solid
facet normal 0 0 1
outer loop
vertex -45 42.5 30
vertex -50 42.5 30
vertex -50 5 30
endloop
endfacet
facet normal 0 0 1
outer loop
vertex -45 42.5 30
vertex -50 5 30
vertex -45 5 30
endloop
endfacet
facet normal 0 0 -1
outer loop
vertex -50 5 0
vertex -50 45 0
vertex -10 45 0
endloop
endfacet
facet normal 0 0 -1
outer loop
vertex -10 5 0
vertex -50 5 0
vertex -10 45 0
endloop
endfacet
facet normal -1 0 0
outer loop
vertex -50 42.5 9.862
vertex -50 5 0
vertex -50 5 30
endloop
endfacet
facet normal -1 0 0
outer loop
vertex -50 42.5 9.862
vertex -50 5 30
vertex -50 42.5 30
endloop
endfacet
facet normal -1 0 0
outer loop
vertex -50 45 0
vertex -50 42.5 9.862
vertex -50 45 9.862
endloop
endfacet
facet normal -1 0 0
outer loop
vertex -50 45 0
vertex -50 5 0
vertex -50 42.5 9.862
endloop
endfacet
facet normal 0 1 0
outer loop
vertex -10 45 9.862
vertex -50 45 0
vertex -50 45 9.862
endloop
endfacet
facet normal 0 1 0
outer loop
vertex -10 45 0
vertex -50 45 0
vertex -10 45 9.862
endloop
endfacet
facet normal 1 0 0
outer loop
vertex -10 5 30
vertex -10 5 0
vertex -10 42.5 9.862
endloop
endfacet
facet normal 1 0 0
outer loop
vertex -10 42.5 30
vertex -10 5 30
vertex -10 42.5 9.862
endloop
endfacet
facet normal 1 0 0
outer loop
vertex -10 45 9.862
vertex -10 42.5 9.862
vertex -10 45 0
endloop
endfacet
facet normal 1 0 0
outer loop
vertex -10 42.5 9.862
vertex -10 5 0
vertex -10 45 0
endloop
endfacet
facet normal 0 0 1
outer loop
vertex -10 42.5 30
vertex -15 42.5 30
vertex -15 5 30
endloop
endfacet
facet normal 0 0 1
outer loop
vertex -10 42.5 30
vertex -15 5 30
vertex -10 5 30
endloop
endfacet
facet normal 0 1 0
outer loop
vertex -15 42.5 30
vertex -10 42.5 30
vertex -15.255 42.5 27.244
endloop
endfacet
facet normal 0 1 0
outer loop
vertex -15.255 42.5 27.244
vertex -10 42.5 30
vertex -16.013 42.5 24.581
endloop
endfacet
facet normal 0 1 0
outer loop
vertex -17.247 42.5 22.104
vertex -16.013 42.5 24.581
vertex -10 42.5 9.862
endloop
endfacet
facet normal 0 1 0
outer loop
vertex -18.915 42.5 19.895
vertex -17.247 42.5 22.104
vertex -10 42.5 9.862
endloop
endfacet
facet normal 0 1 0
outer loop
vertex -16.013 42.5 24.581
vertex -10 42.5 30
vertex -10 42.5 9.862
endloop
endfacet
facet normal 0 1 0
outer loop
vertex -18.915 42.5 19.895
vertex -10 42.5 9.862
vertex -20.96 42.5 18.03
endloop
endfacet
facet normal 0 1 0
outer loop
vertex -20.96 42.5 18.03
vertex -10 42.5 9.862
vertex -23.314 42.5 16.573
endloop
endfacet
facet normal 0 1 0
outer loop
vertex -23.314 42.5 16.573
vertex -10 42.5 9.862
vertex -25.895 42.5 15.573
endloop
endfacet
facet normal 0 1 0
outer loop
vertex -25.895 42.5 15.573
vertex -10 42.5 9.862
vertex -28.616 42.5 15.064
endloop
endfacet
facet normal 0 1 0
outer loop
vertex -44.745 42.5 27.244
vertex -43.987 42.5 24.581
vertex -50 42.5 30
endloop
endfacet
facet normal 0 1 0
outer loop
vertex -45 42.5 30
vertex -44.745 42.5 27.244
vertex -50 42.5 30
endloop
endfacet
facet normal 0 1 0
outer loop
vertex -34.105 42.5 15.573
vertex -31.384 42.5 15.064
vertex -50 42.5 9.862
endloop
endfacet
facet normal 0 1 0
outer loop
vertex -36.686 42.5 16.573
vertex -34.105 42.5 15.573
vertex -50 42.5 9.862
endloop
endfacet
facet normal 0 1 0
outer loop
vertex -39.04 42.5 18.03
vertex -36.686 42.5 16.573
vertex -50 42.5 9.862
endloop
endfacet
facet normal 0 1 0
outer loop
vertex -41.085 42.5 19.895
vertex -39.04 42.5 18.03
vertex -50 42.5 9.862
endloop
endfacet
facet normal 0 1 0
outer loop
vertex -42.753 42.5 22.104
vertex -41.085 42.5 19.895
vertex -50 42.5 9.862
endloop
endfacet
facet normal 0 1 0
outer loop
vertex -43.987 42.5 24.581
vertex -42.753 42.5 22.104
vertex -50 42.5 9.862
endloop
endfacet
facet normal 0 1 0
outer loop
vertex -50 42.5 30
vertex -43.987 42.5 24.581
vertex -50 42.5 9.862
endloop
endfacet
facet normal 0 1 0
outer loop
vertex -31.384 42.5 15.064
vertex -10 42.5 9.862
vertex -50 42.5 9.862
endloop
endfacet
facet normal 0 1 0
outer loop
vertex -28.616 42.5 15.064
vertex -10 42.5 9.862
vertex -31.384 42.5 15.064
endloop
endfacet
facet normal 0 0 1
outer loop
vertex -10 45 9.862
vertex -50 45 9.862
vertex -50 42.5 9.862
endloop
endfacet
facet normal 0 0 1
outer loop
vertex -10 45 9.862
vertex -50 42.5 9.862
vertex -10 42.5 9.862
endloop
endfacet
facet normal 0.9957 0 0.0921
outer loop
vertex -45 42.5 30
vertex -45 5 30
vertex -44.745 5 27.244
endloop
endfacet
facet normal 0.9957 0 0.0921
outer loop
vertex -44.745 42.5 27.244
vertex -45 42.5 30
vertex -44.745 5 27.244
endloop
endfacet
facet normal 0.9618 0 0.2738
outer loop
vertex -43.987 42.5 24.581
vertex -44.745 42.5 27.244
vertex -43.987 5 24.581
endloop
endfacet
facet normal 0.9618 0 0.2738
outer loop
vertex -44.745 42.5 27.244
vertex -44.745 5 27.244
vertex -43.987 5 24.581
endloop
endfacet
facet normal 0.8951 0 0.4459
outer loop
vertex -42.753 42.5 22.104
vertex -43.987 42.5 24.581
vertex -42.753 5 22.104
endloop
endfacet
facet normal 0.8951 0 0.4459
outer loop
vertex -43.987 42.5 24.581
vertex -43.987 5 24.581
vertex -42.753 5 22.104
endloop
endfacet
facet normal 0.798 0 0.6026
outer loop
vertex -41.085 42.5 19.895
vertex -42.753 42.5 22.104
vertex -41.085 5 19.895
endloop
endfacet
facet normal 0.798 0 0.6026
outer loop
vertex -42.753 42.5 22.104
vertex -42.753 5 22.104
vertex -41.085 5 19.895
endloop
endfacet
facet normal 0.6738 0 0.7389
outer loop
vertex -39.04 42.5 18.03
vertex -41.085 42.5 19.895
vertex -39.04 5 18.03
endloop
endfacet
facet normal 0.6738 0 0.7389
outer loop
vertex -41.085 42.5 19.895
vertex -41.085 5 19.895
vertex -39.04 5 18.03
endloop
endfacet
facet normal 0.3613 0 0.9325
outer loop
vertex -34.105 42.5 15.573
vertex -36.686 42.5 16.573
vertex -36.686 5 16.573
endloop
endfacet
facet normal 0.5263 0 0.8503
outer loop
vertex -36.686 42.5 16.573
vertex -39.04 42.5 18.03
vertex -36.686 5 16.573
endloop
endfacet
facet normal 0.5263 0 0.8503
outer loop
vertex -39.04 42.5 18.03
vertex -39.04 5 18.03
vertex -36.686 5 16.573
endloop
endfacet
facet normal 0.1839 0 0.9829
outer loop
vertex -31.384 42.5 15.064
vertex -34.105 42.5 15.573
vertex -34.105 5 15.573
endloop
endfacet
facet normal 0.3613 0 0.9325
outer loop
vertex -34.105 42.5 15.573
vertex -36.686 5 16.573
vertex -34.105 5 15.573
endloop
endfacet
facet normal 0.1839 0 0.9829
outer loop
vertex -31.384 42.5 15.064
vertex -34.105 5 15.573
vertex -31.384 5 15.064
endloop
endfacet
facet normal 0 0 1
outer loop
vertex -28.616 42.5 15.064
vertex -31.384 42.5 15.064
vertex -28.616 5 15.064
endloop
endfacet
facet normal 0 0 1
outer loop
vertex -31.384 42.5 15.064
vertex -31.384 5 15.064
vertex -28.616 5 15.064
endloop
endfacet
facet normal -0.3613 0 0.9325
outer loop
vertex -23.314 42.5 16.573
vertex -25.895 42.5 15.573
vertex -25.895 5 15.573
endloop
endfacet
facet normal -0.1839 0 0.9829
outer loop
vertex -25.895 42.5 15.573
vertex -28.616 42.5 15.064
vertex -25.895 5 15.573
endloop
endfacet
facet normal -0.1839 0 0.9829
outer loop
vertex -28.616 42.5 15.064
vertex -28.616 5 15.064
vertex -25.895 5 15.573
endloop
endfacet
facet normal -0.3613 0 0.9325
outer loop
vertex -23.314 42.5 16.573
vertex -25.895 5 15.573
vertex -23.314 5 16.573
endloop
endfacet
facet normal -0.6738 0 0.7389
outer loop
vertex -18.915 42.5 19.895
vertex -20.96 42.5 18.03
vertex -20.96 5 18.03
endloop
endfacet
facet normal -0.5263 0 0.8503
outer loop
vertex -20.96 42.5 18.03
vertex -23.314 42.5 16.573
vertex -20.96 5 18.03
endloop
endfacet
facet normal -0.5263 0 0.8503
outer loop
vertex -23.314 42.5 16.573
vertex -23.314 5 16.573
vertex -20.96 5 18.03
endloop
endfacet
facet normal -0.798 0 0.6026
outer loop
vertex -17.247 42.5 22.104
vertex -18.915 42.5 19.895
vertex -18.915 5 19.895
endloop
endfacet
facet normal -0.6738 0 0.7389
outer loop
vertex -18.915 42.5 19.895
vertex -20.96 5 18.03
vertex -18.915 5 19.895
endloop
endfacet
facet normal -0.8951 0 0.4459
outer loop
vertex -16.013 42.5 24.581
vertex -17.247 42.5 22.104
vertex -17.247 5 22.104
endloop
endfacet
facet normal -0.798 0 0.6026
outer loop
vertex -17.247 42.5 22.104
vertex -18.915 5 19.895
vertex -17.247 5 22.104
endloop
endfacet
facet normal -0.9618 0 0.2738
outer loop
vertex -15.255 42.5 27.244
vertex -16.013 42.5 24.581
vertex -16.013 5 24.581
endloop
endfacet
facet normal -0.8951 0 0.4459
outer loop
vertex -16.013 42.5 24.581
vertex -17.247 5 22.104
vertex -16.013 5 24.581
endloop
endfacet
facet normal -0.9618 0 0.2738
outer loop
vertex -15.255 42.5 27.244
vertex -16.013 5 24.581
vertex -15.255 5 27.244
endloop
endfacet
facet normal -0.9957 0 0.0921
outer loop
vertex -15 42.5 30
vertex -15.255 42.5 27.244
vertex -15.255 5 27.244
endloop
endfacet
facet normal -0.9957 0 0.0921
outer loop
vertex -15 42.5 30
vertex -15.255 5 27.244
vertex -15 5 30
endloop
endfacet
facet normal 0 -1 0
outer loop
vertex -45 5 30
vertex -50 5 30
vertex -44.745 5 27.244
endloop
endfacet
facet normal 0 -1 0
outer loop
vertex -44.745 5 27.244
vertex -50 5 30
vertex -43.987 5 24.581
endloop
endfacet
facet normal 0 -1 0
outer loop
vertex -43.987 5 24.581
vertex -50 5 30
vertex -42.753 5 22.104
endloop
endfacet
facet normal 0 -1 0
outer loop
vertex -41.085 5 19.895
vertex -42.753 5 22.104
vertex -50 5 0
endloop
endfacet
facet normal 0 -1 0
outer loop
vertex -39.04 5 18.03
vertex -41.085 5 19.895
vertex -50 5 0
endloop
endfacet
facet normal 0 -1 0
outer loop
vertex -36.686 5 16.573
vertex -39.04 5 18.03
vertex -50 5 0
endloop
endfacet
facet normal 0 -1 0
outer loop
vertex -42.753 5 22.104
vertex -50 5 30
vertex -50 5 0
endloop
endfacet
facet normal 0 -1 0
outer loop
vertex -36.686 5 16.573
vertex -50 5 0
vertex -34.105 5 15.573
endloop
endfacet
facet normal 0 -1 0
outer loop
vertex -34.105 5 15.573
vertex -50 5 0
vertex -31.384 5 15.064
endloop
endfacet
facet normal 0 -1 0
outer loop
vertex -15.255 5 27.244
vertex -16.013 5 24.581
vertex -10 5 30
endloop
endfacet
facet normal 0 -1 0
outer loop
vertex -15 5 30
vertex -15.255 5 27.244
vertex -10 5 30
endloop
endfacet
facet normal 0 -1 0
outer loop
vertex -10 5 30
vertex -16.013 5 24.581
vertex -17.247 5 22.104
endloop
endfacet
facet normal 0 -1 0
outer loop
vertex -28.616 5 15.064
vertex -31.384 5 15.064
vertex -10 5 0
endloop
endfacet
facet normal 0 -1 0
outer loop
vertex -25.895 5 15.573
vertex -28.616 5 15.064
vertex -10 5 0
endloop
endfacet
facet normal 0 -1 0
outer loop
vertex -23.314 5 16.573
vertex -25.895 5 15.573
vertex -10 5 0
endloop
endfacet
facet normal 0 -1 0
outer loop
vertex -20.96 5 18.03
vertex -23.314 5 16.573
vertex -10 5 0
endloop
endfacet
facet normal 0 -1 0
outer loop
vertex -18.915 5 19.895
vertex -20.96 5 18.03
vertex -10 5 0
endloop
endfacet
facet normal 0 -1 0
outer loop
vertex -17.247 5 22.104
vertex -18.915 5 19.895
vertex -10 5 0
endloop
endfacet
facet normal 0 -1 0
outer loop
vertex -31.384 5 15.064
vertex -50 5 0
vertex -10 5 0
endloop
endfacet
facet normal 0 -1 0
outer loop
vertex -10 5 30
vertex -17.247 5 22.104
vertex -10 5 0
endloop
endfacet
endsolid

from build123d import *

# Parameters (mm, degrees)
SKETCH1_W           = 40
SKETCH1_H           = 40
BOSS_EXTRUDE1_DEPTH = 30
SKETCH2_R           = 15
CUT_EXTRUDE1_DEPTH  = 41
CUT_EXTRUDE2_DEPTH  = 2.5


with BuildPart() as part:
    # Sketch1 → Boss-Extrude1 (new body)
    with BuildSketch(Plane.XY):
        with Locations((-30, 25)):
            Rectangle(SKETCH1_W, SKETCH1_H)
    extrude(amount=BOSS_EXTRUDE1_DEPTH)

    # Sketch2 → Cut-Extrude1 (cut, through all)
    with BuildSketch(Plane.XZ.offset(-5)):
        with Locations((-30, 30)):
            Circle(SKETCH2_R)
    extrude(amount=-CUT_EXTRUDE1_DEPTH, mode=Mode.SUBTRACT)

    # Sketch3 → Cut-Extrude2 (cut)
    with BuildSketch(Plane(origin=(0, 45, 0), x_dir=(1, 0, 0), z_dir=(0, 1, 0))):
        with BuildLine():
            Line((-10, -30), (-15, -30))
            ThreePointArc((-15, -30), (-30, -15), (-45, -30))
            Line((-45, -30), (-50, -30))
            Line((-50, -30), (-50, -9.862457081))
            Line((-50, -9.862457081), (-10, -9.862457081))
            Line((-10, -9.862457081), (-10, -30))
        make_face()
    extrude(amount=-CUT_EXTRUDE2_DEPTH, mode=Mode.SUBTRACT)


solid = part.part
